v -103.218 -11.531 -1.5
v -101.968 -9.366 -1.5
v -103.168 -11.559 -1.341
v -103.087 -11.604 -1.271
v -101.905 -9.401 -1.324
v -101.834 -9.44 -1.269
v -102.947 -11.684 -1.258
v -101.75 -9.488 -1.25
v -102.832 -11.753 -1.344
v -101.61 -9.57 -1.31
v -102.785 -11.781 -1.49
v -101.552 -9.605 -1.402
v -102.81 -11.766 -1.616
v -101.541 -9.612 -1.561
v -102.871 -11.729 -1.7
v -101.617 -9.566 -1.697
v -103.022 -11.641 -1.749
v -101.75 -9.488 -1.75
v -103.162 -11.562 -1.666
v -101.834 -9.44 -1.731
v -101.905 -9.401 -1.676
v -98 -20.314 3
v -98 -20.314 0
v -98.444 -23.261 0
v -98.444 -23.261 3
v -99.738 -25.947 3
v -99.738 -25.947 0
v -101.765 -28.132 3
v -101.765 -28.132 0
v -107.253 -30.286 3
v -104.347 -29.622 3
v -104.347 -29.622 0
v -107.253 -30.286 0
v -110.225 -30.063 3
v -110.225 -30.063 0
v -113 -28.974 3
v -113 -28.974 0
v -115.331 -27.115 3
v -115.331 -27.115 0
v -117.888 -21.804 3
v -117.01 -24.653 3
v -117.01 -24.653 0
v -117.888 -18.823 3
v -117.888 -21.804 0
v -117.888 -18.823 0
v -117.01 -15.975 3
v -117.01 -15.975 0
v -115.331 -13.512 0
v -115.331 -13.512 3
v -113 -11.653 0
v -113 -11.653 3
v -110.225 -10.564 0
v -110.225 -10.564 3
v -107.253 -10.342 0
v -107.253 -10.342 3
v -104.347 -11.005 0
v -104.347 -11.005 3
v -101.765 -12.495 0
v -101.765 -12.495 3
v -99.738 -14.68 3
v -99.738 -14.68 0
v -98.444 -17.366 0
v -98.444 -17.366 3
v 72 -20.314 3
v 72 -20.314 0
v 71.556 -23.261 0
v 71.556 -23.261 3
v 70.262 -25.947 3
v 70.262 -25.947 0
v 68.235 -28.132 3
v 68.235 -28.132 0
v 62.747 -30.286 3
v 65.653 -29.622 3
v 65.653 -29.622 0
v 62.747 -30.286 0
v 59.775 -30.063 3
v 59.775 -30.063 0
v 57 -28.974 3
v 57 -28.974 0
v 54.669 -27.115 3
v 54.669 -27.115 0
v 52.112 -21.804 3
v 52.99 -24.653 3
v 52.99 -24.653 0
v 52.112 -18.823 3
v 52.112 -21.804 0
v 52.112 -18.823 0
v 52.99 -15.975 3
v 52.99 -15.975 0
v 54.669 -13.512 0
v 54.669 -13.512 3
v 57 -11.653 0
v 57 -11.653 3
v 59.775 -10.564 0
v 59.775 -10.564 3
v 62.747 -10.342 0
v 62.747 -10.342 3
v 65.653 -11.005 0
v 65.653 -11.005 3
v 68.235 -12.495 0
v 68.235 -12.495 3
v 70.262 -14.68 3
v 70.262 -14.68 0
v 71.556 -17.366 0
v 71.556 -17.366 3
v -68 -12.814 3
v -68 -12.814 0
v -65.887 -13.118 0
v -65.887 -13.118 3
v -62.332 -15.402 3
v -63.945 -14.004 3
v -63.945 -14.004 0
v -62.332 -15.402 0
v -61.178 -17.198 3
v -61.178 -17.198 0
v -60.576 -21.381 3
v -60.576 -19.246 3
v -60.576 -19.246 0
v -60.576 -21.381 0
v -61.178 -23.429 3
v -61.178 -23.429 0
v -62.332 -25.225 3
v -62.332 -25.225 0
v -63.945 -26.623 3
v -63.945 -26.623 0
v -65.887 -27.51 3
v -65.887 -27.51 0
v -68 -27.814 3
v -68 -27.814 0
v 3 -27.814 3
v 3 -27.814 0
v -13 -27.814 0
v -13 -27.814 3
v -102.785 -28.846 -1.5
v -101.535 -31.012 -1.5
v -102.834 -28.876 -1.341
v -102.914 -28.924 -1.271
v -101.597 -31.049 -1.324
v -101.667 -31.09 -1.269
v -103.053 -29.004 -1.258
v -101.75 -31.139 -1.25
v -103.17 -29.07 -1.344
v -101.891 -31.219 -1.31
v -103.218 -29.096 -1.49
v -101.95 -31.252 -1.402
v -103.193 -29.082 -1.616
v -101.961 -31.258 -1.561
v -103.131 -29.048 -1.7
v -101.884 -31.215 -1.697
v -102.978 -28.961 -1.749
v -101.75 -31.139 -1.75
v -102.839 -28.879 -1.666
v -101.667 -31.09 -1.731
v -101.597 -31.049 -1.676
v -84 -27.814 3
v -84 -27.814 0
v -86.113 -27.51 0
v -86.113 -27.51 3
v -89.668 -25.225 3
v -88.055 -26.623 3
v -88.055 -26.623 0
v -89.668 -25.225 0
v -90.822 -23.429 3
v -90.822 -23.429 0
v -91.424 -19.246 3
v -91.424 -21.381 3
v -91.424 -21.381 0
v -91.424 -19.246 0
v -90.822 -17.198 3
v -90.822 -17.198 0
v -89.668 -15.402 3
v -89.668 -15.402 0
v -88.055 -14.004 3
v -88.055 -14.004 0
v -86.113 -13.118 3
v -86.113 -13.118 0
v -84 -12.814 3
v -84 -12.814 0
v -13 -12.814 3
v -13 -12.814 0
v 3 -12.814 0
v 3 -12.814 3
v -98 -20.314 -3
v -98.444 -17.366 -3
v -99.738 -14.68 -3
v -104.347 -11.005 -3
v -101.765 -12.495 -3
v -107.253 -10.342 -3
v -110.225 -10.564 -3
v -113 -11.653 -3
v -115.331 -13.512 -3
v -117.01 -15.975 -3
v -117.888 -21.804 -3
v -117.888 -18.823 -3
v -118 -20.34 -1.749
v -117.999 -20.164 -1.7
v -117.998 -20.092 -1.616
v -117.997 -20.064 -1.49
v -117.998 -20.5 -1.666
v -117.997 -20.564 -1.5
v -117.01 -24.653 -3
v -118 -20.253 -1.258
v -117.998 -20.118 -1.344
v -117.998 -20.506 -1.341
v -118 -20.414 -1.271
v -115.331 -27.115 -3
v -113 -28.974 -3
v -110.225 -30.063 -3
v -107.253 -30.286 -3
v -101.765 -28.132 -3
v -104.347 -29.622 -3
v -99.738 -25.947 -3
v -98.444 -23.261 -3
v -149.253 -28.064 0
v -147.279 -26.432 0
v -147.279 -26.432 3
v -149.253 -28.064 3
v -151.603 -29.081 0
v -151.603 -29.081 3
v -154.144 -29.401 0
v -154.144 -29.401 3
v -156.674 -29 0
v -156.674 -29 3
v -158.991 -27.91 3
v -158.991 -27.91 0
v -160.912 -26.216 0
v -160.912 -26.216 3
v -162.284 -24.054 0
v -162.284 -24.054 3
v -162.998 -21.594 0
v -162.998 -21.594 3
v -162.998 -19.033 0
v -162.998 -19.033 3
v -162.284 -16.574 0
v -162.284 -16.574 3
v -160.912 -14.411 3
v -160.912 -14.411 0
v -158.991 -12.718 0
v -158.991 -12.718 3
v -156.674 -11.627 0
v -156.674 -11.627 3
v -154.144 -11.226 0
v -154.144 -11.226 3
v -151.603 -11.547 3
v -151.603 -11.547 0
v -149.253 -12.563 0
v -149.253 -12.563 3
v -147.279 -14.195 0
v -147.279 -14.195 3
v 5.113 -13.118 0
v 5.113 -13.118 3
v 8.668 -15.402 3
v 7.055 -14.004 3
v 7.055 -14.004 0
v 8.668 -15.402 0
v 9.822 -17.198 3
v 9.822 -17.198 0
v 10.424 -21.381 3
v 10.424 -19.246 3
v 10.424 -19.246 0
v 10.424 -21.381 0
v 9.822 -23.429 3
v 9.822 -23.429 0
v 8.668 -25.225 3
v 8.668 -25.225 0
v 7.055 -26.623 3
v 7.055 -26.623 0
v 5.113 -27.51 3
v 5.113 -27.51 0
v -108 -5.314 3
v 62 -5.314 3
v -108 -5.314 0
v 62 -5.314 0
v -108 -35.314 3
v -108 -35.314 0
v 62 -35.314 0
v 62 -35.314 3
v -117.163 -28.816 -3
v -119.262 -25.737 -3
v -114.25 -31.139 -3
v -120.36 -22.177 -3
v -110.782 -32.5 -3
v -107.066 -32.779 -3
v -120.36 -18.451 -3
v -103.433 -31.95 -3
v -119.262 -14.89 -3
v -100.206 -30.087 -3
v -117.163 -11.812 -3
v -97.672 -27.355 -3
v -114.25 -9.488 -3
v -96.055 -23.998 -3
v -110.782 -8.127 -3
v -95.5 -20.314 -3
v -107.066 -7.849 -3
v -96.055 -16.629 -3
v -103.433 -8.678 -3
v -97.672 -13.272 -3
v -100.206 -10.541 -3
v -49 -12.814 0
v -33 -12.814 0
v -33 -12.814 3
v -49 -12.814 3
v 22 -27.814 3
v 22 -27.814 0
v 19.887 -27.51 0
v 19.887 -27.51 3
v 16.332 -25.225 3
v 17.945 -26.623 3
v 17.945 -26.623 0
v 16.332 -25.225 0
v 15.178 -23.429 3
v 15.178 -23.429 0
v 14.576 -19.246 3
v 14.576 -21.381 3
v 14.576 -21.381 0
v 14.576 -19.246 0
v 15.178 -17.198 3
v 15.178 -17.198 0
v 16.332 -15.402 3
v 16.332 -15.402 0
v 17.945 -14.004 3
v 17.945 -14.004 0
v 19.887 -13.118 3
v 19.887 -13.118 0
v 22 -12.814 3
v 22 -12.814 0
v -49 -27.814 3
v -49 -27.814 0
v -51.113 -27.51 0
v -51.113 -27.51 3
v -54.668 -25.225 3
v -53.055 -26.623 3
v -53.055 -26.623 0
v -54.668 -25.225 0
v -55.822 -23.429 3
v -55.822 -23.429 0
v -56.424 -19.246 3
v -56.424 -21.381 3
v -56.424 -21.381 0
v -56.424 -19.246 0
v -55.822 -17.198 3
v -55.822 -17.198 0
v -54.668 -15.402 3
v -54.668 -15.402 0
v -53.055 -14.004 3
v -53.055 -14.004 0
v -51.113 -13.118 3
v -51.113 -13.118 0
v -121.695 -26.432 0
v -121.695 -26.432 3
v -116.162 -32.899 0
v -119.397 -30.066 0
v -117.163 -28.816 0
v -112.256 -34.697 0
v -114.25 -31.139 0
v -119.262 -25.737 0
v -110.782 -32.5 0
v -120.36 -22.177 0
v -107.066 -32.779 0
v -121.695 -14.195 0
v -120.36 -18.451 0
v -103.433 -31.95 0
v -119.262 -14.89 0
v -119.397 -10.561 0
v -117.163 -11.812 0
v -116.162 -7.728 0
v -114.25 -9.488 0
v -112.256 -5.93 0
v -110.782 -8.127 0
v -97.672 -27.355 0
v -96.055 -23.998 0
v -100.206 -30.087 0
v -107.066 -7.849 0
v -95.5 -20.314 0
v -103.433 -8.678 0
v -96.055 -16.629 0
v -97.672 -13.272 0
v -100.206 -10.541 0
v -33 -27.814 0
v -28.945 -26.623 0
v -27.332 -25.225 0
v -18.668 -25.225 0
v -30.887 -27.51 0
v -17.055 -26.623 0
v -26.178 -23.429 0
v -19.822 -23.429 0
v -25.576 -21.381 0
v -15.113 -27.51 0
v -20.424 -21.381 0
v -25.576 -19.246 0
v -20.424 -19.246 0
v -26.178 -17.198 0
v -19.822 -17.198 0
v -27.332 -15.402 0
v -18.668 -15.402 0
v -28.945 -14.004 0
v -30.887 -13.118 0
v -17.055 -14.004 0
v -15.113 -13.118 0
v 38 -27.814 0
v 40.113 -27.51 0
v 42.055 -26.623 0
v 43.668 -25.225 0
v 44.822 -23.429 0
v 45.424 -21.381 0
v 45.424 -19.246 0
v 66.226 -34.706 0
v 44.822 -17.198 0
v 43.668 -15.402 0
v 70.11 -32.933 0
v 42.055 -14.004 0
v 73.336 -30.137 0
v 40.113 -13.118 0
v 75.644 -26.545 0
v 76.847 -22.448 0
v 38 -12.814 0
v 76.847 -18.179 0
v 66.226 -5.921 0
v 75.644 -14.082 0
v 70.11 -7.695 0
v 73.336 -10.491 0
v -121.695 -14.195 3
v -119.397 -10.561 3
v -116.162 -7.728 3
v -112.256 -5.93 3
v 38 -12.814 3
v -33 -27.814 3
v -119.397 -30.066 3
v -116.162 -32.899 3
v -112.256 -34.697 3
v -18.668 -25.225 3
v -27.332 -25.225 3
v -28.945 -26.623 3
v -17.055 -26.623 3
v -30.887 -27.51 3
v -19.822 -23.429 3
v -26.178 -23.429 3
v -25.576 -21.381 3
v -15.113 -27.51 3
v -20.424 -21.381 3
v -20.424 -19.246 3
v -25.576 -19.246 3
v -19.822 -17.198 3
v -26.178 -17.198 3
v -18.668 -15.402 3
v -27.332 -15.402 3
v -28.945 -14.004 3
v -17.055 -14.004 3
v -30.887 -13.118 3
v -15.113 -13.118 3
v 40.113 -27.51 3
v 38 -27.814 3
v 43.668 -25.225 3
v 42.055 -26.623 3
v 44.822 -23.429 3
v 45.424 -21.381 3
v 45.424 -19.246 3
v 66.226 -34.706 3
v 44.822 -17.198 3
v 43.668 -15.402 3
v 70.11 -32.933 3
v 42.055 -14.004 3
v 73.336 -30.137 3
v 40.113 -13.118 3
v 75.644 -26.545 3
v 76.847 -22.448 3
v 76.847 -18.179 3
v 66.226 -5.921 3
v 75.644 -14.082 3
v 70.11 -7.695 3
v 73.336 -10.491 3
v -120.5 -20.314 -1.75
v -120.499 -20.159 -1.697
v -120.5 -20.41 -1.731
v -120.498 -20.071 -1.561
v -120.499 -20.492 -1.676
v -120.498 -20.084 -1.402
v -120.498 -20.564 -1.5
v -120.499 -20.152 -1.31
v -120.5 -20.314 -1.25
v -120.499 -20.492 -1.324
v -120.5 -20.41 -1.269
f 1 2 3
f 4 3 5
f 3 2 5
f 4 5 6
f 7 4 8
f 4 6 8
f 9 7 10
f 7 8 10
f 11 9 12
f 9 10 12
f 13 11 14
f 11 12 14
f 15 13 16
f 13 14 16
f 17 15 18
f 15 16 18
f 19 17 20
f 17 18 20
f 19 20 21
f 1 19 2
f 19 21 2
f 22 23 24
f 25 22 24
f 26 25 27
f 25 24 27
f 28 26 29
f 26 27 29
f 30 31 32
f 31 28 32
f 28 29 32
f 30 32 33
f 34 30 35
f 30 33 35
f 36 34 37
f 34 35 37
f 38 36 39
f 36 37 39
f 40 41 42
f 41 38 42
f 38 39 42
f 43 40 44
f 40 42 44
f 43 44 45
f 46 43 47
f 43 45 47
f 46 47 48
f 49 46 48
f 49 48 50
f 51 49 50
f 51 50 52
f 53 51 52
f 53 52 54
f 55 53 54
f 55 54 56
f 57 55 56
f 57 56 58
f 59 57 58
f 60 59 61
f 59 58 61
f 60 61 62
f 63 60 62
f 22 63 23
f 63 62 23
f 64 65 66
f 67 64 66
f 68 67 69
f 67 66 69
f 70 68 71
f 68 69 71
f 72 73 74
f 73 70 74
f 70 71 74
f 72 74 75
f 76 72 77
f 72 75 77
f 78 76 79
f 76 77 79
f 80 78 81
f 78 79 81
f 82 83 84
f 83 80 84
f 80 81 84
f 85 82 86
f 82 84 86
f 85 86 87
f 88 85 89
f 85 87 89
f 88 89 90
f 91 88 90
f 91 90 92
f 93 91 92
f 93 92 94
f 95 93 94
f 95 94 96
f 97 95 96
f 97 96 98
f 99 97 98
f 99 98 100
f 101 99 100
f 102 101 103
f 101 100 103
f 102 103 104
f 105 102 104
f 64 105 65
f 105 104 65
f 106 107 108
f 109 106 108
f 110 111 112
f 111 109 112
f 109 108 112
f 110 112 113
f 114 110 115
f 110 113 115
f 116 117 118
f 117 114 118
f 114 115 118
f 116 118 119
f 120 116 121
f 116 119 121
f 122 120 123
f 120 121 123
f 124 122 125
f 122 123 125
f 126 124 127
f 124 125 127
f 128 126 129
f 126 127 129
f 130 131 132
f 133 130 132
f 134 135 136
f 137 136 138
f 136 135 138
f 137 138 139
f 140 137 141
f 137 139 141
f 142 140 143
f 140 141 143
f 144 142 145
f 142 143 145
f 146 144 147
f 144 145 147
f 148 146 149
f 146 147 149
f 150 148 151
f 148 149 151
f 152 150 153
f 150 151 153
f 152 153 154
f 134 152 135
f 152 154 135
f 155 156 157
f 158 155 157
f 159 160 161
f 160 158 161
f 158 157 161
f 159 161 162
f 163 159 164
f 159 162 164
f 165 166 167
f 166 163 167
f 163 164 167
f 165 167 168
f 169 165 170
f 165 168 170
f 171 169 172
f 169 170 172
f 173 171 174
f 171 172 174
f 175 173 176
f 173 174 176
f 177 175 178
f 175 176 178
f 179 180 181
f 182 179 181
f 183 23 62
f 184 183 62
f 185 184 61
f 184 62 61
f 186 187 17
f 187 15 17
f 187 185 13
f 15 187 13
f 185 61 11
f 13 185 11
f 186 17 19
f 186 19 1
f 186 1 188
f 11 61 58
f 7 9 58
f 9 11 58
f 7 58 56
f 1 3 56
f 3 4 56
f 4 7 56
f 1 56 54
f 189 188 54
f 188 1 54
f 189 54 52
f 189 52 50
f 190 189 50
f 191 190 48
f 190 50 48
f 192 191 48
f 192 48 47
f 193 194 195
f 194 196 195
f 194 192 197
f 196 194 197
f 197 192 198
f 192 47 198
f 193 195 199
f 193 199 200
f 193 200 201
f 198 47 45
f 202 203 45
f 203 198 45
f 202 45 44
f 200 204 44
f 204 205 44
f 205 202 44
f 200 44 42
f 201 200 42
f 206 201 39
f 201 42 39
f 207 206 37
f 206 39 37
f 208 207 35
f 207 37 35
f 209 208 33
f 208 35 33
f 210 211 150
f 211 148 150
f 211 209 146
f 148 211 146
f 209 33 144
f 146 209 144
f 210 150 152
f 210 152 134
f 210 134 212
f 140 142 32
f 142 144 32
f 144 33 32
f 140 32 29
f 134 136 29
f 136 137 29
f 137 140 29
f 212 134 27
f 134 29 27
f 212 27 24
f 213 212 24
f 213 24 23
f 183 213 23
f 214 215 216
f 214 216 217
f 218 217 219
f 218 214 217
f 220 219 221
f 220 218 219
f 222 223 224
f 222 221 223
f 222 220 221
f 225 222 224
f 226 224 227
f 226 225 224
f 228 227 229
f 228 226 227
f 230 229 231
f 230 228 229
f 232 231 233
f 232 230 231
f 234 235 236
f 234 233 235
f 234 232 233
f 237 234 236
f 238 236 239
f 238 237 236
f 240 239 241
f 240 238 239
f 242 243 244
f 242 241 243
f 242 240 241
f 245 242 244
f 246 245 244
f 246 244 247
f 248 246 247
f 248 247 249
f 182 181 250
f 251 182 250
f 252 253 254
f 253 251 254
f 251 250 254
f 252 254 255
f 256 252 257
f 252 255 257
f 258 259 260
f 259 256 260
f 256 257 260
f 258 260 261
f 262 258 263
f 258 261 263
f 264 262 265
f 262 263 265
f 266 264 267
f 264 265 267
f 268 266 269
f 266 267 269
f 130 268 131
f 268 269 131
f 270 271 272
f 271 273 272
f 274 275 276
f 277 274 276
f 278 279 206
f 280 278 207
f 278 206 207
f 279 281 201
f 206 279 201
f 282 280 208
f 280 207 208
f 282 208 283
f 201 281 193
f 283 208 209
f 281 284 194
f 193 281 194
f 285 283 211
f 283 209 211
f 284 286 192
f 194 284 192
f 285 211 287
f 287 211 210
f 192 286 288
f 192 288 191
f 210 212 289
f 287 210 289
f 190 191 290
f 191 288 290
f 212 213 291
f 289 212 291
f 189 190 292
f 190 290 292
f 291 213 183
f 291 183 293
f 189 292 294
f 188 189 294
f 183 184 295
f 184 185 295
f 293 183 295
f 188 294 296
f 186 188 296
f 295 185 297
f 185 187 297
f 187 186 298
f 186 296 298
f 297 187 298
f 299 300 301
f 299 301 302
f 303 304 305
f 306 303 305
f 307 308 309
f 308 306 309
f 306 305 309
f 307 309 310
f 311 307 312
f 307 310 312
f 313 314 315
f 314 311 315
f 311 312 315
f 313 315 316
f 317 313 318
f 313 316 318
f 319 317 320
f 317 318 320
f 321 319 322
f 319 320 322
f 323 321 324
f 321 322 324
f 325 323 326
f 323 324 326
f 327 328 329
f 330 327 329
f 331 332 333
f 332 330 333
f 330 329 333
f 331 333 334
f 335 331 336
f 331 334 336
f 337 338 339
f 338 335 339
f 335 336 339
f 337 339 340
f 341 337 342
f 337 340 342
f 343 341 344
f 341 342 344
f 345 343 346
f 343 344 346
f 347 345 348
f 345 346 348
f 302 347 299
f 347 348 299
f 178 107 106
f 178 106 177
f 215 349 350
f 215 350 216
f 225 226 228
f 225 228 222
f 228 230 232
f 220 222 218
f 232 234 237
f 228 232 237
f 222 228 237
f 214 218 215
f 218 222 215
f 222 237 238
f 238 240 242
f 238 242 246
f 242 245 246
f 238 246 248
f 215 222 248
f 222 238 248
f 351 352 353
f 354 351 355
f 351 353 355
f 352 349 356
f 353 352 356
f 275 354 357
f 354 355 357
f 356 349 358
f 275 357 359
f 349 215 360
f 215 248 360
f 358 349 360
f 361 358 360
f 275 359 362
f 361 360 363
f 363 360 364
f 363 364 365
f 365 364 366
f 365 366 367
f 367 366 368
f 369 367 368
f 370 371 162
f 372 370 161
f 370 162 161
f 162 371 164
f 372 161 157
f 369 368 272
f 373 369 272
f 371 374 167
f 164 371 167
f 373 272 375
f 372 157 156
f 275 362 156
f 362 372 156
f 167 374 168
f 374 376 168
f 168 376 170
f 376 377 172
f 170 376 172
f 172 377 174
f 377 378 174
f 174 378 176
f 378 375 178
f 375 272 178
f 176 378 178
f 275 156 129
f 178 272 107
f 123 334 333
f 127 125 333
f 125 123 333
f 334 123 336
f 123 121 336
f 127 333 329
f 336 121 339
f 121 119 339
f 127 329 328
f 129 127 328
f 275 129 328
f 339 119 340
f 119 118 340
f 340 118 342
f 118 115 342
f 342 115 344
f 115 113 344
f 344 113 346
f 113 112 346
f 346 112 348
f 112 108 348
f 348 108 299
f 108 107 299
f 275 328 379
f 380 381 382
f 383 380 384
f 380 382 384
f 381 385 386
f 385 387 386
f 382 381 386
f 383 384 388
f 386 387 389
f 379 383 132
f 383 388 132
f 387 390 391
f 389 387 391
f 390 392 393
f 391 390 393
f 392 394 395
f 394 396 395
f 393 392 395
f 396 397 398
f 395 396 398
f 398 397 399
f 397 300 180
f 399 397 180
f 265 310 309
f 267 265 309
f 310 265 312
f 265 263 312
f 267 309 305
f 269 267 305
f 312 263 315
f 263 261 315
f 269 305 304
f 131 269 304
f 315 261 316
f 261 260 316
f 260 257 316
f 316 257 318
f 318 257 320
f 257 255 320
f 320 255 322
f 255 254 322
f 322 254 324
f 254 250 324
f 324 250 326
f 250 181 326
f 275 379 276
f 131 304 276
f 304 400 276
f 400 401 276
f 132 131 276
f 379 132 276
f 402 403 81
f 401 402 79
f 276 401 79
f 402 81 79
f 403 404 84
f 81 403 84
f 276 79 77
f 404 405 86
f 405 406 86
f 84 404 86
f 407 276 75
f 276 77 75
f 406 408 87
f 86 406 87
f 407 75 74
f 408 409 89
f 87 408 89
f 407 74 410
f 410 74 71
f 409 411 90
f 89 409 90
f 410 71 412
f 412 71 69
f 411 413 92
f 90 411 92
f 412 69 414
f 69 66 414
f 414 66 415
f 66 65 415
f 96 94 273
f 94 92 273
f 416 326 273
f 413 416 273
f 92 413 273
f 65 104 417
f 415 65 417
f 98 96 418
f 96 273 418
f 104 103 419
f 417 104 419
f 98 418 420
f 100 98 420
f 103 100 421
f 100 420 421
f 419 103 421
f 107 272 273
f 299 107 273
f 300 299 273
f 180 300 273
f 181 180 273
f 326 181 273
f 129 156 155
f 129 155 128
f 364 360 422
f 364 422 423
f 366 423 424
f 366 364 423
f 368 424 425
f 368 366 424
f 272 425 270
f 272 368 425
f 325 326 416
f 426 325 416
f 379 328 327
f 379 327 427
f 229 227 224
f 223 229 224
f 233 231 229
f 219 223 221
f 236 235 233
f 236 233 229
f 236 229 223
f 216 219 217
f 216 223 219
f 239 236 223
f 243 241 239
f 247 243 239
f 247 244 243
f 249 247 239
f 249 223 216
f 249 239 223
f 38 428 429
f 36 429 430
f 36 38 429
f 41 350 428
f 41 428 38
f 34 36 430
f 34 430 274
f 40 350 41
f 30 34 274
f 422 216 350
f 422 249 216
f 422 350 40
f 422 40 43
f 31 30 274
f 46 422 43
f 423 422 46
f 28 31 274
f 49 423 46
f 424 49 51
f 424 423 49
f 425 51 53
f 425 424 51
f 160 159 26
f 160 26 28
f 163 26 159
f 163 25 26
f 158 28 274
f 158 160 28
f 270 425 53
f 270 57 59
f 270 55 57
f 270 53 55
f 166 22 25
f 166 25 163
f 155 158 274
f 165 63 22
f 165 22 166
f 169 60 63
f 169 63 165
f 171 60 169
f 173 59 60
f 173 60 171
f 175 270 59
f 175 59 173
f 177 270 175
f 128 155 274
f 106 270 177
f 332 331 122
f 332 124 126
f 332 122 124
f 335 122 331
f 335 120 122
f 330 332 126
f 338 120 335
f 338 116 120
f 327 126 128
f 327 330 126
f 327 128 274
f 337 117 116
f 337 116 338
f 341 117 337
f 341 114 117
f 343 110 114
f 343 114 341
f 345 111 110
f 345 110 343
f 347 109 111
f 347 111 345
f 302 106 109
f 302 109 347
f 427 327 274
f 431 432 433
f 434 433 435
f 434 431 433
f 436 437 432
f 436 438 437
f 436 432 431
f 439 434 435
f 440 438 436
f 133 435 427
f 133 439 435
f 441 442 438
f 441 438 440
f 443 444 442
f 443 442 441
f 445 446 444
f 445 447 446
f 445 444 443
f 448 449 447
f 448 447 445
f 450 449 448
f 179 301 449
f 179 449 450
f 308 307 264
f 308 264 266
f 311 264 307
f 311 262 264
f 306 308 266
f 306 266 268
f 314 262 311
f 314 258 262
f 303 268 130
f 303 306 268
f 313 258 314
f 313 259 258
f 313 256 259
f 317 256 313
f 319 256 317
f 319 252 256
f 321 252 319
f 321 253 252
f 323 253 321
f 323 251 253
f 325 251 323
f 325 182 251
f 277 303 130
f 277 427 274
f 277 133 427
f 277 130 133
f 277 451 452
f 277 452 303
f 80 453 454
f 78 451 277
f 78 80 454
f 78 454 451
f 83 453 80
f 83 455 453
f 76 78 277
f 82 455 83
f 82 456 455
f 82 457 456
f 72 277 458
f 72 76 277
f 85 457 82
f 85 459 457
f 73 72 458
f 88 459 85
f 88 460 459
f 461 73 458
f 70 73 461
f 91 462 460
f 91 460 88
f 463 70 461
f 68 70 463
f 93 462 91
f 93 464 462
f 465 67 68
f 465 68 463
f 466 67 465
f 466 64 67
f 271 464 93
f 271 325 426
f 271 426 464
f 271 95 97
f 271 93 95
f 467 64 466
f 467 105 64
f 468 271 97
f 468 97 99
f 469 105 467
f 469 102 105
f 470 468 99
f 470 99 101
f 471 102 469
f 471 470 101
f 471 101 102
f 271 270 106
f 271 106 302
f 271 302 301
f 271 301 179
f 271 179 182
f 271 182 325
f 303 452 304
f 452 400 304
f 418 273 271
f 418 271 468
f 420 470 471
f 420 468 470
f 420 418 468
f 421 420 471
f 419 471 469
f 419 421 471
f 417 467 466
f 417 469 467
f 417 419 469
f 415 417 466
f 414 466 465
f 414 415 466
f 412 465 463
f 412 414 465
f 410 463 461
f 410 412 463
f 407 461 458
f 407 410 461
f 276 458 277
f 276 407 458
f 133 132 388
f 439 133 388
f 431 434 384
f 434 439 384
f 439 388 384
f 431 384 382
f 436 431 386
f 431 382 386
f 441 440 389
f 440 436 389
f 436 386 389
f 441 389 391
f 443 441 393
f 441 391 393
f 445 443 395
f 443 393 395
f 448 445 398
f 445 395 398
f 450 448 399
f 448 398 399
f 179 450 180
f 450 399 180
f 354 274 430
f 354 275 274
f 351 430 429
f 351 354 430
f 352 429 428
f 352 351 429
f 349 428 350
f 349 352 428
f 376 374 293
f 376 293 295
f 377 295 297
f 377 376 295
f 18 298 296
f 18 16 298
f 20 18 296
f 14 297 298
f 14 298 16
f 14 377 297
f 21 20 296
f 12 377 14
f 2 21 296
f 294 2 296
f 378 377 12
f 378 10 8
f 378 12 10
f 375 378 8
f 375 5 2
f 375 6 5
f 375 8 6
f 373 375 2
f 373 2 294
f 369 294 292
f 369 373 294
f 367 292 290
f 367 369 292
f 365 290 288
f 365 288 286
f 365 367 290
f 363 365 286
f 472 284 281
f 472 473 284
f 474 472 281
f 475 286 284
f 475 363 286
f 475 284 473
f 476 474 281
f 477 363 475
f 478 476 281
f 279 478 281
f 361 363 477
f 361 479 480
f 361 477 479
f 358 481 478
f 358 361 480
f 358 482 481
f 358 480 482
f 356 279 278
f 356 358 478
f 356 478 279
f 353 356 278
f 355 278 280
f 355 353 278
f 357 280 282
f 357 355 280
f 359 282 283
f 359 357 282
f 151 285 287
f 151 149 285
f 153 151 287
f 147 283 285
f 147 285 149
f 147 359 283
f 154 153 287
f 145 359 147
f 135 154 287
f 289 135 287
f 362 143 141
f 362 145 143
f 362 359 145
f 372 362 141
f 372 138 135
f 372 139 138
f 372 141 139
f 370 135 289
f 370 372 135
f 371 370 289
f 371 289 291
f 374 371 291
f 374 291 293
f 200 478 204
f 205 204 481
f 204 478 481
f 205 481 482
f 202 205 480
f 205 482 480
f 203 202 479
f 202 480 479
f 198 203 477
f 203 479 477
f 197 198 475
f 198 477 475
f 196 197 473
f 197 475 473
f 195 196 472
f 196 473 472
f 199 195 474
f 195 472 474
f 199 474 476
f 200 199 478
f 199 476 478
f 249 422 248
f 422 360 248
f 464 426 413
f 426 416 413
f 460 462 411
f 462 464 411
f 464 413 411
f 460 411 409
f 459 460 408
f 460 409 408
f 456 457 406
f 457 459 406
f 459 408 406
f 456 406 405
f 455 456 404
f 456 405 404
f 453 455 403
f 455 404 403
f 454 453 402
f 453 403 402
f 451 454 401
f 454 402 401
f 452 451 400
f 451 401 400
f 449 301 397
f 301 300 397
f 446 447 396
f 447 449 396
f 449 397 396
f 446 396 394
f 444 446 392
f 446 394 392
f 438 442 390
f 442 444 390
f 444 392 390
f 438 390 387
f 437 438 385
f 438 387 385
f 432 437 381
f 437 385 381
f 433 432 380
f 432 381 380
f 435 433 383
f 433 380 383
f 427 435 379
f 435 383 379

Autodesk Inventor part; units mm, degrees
ref_plane "YZ Plane" through (0, 0, 0) normal (1, 0, 0) x (0, 1, 0)
ref_plane "XZ Plane" through (0, 0, 0) normal (0, 1, 0) x (-1, 0, 0)
ref_plane "XY Plane" through (0, 0, 0) normal (0, 0, 1) x (1, 0, 0)
sketch "Sketch2" plane through (0, 0, 0) normal (0, 0, 1) x (1, 0, 0)
  line L0 (-108, -20.3137) -> (62, -20.3137) construction
  line L1 (-108, -35.3137) -> (62, -35.3137)
  line L2 (62, -5.3137) -> (-108, -5.3137)
  arc A0 (-108, -5.3137) -> (-108, -35.3137) centre (-108, -20.3137) ccw
  arc A1 (62, -35.3137) -> (62, -5.3137) centre (62, -20.3137) ccw
  circle A2 centre (-108, -20.3137) radius 10
  circle A3 centre (62, -20.3137) radius 10
  line L3 (-84, -20.3137) -> (-68, -20.3137) construction
  line L4 (-84, -27.8137) -> (-68, -27.8137)
  line L5 (-68, -12.8137) -> (-84, -12.8137)
  arc A4 (-84, -12.8137) -> (-84, -27.8137) centre (-84, -20.3137) ccw
  arc A5 (-68, -27.8137) -> (-68, -12.8137) centre (-68, -20.3137) ccw
  line L6 (-23, -46) -> (-23, 6) construction
  arc A6 (-33, -27.8137) -> (-33, -12.8137) centre (-33, -20.3137) ccw
  line L7 (-49, -20.3137) -> (-33, -20.3137) construction
  line L8 (-49, -27.8137) -> (-33, -27.8137)
  line L9 (-33, -12.8137) -> (-49, -12.8137)
  arc A7 (-49, -12.8137) -> (-49, -27.8137) centre (-49, -20.3137) ccw
  line L10 (38, -20.3137) -> (22, -20.3137) construction
  line L11 (38, -27.8137) -> (22, -27.8137)
  line L12 (22, -12.8137) -> (38, -12.8137)
  arc A8 (38, -27.8137) -> (38, -12.8137) centre (38, -20.3137) ccw
  arc A9 (22, -12.8137) -> (22, -27.8137) centre (22, -20.3137) ccw
  arc A10 (-13, -12.8137) -> (-13, -27.8137) centre (-13, -20.3137) ccw
  line L13 (3, -20.3137) -> (-13, -20.3137) construction
  line L14 (3, -27.8137) -> (-13, -27.8137)
  line L15 (-13, -12.8137) -> (3, -12.8137)
  arc A11 (3, -27.8137) -> (3, -12.8137) centre (3, -20.3137) ccw
  line L16 (-121.6954, -14.1952) -> (-147.279, -14.1952)
  line L17 (-121.6954, -26.4323) -> (-147.279, -26.4323)
  circle A12 centre (-154, -20.3137) radius 9.0889
  circle A13 centre (-108, -20.3137) radius 12.5
  line L18 (-119.5282, -20.3137) -> (-121.5282, -20.3137)
  point P0 (0, 0)
  point P1 (-23, -20.3137)
  point P2 (-76, -20.3137)
  point P3 (-41, -20.3137)
  point P4 (30, -20.3137)
  point P5 (-5, -20.3137)
  point P6 (-120.5, -20.3137)
  dimension "d51" = 25
  dimension "d27" = 170
  dimension "d28" = 30
  dimension "d29" = 20
  dimension "d30" = 20
  dimension "d31" = 16
  dimension "d32" = 15
  dimension "d43" = 35
  dimension "d48" = 40
  dimension "d57" = 2
extrude "Extrusion2" add sketch "Sketch2" along normal blind 3 contours A0 L2 A1 L1 | L17 A12 L16 A0 | A12 | A13
extrude "Extrusion3" add sketch "Sketch2" against normal blind 3 contours A13
ref_plane "Work Plane1" through (-119.5282, -20.3137, 0) normal (0, -1, 0) x (-1, 0, 0)
sketch "Sketch4" plane through (-108, -20.3137, -3) normal (0, 0, -1) x (-1, 0, 0)
  line L0 (11.5282, 0) -> (13.5282, 0) projected
  circle A0 centre (0, 0) radius 12.5 projected
  point P0 (-108, 20.3137)
  point P1 (12.5, 0)
ref_plane "Work Plane2" through (-120.5, -20.3137, -3) normal (-1, 0, 0) x (0, -1, 0)
sketch "Sketch5" plane through (-120.5, -20.3137, -3) normal (-1, 0, 0) x (0, -1, 0)
  line L0 (9.0889, 3) -> (-9.0889, 3) projected
  line L1 (-12.5, 0) -> (12.5, 0) projected
  line L2 (0, -1.2) -> (0, 7.2) projected
  line L3 (15, 3) -> (-15, 3) projected
  line L4 (0, 3) -> (0, 0)
  line L5 (10, 0) -> (-10, 0) projected
  line L6 (0, 3) -> (0, 0)
  circle A0 centre (0, 1.5) radius 0.25
  point P0 (-20.3137, 3)
  point P1 (-6.1186, 3)
  point P2 (6.1186, 3)
  dimension "d63" = 0.5
extrude "Extrusion5" cut sketch "Sketch5" against normal up to surface
pattern_circular "Circular Pattern1" count 3 over 360 about axis through (-108, -20.3137, 0) along (0, 0, -1) of "Extrusion5"
properties part number "p1"
